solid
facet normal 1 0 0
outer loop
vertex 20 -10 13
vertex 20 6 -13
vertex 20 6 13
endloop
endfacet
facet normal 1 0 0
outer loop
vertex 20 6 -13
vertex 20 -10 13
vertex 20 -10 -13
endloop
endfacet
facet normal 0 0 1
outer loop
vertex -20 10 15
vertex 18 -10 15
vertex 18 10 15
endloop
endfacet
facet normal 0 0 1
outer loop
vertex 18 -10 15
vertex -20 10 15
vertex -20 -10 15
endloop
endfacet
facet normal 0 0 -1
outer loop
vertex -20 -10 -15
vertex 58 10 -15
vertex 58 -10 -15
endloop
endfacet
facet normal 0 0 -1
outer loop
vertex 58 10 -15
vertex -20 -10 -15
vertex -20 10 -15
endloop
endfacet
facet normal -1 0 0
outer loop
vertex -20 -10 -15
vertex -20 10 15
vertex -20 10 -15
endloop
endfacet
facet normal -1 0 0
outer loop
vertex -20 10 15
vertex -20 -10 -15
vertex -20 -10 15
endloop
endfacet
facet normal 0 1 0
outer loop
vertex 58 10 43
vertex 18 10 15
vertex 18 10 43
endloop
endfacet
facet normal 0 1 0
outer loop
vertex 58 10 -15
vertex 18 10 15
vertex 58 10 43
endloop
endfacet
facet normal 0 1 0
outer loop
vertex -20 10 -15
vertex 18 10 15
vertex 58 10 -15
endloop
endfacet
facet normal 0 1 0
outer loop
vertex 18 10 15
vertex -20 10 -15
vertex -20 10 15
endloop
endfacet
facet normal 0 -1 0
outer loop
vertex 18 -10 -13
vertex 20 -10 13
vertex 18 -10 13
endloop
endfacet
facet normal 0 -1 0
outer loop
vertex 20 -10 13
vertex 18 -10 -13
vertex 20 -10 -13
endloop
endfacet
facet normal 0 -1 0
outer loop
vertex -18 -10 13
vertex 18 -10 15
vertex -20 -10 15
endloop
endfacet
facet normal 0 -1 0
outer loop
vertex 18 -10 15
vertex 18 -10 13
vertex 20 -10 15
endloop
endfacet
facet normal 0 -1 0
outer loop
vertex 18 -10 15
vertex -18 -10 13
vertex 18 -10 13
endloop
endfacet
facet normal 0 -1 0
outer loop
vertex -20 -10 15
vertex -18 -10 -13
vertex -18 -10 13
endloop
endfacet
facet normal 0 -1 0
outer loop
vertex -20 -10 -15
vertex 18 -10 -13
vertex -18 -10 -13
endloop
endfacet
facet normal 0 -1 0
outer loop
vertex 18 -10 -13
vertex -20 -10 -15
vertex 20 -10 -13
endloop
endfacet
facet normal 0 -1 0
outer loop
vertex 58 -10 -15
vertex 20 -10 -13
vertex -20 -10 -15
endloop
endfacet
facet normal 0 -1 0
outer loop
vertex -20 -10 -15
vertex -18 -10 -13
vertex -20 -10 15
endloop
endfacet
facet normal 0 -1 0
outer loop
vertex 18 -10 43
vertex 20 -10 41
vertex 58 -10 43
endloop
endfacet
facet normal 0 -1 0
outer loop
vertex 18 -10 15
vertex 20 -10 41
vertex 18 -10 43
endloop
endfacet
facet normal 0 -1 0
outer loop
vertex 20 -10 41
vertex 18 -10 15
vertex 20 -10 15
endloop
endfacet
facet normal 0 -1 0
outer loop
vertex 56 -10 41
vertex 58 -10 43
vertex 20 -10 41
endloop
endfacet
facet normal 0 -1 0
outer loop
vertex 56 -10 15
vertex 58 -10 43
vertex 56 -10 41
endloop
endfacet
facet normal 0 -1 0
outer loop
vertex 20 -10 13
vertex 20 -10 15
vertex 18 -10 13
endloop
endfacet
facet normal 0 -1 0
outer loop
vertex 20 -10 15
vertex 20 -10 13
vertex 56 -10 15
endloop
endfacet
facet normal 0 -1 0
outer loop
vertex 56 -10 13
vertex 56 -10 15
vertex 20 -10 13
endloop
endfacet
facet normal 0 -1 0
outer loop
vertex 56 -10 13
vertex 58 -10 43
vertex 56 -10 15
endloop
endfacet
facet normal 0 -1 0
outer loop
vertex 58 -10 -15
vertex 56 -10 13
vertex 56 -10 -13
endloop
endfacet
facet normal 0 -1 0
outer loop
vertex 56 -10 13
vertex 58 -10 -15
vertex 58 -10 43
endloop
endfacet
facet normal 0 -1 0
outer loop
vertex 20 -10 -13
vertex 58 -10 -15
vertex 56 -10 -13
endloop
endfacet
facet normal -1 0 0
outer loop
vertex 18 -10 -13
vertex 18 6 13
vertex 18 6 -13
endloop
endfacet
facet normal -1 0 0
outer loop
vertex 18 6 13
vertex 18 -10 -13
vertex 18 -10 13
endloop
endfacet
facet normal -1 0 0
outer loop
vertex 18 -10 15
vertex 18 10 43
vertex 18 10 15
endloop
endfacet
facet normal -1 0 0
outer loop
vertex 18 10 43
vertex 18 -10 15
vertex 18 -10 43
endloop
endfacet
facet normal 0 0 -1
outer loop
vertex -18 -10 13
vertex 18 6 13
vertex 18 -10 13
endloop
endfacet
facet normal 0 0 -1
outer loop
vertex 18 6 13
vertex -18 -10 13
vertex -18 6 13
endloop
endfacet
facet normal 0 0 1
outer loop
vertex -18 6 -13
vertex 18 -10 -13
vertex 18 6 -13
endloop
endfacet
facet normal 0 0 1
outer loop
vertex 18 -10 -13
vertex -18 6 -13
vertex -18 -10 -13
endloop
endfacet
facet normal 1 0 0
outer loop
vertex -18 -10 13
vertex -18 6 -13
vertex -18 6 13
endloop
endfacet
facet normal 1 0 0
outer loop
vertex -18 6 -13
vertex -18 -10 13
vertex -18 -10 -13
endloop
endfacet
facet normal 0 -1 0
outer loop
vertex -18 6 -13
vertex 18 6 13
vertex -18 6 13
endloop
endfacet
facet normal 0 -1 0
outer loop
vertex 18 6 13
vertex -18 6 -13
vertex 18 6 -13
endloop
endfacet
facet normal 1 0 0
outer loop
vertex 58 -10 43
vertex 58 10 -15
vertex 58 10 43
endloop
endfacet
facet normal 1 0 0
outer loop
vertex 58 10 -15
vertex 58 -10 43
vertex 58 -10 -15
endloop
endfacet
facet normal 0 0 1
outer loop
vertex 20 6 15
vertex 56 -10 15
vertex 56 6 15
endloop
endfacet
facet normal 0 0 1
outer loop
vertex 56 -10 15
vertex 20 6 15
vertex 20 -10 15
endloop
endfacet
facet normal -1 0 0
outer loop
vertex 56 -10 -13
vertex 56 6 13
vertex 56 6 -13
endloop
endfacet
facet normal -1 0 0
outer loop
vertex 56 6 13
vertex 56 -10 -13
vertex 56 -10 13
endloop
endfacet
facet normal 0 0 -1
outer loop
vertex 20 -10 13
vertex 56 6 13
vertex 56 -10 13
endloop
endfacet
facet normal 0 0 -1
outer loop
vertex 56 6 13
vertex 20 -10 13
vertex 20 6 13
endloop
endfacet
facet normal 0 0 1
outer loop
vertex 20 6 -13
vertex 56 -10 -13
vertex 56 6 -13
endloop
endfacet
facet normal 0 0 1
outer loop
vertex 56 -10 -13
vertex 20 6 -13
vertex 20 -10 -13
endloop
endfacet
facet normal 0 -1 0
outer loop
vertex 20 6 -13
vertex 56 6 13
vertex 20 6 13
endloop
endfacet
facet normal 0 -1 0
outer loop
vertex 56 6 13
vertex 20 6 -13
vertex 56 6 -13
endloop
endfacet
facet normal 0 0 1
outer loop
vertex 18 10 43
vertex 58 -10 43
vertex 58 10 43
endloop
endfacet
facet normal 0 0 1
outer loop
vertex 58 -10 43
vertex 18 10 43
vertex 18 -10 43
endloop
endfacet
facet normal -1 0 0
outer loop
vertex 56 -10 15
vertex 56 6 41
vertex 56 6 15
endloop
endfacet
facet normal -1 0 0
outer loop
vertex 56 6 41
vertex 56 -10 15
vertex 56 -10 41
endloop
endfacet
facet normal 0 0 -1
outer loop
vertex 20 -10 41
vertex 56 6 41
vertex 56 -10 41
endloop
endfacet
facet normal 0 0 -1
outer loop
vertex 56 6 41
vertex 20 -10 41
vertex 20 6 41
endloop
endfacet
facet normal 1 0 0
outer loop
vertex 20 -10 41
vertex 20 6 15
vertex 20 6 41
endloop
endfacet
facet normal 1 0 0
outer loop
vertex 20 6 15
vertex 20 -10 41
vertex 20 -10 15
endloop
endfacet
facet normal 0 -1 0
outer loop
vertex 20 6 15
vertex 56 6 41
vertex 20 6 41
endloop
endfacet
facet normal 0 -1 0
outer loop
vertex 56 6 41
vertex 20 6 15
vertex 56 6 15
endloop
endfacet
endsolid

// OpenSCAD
// GENERATEUR D'ESCALIER DE NICHES - Gilbert Duval 2021

largeur = 40;
hauteur = 30;
profondeur = 20;
epaisseur = 4;
avecFond = true;
nbMarches = 2;
inverser = false;

uniteV = (largeur - epaisseur/2)  * (inverser ? -1 : 1);
uniteH = (hauteur - epaisseur/2);

for(i = [1 : nbMarches])
  translate([(i-1) * uniteV, 0, 0])
    colonne(i);

module colonne(n){
  for( j = [1 : n])
    translate([0, 0, (j-1) * uniteH])
      niche();
}

module niche(){
difference() {
cube(size = [largeur, profondeur, hauteur], center = true);
translate([0, avecFond ? -epaisseur : 0, 0])
  cube(size = [largeur - epaisseur, profondeur + 0*0.1,
               hauteur - epaisseur], center = true);
}
}
